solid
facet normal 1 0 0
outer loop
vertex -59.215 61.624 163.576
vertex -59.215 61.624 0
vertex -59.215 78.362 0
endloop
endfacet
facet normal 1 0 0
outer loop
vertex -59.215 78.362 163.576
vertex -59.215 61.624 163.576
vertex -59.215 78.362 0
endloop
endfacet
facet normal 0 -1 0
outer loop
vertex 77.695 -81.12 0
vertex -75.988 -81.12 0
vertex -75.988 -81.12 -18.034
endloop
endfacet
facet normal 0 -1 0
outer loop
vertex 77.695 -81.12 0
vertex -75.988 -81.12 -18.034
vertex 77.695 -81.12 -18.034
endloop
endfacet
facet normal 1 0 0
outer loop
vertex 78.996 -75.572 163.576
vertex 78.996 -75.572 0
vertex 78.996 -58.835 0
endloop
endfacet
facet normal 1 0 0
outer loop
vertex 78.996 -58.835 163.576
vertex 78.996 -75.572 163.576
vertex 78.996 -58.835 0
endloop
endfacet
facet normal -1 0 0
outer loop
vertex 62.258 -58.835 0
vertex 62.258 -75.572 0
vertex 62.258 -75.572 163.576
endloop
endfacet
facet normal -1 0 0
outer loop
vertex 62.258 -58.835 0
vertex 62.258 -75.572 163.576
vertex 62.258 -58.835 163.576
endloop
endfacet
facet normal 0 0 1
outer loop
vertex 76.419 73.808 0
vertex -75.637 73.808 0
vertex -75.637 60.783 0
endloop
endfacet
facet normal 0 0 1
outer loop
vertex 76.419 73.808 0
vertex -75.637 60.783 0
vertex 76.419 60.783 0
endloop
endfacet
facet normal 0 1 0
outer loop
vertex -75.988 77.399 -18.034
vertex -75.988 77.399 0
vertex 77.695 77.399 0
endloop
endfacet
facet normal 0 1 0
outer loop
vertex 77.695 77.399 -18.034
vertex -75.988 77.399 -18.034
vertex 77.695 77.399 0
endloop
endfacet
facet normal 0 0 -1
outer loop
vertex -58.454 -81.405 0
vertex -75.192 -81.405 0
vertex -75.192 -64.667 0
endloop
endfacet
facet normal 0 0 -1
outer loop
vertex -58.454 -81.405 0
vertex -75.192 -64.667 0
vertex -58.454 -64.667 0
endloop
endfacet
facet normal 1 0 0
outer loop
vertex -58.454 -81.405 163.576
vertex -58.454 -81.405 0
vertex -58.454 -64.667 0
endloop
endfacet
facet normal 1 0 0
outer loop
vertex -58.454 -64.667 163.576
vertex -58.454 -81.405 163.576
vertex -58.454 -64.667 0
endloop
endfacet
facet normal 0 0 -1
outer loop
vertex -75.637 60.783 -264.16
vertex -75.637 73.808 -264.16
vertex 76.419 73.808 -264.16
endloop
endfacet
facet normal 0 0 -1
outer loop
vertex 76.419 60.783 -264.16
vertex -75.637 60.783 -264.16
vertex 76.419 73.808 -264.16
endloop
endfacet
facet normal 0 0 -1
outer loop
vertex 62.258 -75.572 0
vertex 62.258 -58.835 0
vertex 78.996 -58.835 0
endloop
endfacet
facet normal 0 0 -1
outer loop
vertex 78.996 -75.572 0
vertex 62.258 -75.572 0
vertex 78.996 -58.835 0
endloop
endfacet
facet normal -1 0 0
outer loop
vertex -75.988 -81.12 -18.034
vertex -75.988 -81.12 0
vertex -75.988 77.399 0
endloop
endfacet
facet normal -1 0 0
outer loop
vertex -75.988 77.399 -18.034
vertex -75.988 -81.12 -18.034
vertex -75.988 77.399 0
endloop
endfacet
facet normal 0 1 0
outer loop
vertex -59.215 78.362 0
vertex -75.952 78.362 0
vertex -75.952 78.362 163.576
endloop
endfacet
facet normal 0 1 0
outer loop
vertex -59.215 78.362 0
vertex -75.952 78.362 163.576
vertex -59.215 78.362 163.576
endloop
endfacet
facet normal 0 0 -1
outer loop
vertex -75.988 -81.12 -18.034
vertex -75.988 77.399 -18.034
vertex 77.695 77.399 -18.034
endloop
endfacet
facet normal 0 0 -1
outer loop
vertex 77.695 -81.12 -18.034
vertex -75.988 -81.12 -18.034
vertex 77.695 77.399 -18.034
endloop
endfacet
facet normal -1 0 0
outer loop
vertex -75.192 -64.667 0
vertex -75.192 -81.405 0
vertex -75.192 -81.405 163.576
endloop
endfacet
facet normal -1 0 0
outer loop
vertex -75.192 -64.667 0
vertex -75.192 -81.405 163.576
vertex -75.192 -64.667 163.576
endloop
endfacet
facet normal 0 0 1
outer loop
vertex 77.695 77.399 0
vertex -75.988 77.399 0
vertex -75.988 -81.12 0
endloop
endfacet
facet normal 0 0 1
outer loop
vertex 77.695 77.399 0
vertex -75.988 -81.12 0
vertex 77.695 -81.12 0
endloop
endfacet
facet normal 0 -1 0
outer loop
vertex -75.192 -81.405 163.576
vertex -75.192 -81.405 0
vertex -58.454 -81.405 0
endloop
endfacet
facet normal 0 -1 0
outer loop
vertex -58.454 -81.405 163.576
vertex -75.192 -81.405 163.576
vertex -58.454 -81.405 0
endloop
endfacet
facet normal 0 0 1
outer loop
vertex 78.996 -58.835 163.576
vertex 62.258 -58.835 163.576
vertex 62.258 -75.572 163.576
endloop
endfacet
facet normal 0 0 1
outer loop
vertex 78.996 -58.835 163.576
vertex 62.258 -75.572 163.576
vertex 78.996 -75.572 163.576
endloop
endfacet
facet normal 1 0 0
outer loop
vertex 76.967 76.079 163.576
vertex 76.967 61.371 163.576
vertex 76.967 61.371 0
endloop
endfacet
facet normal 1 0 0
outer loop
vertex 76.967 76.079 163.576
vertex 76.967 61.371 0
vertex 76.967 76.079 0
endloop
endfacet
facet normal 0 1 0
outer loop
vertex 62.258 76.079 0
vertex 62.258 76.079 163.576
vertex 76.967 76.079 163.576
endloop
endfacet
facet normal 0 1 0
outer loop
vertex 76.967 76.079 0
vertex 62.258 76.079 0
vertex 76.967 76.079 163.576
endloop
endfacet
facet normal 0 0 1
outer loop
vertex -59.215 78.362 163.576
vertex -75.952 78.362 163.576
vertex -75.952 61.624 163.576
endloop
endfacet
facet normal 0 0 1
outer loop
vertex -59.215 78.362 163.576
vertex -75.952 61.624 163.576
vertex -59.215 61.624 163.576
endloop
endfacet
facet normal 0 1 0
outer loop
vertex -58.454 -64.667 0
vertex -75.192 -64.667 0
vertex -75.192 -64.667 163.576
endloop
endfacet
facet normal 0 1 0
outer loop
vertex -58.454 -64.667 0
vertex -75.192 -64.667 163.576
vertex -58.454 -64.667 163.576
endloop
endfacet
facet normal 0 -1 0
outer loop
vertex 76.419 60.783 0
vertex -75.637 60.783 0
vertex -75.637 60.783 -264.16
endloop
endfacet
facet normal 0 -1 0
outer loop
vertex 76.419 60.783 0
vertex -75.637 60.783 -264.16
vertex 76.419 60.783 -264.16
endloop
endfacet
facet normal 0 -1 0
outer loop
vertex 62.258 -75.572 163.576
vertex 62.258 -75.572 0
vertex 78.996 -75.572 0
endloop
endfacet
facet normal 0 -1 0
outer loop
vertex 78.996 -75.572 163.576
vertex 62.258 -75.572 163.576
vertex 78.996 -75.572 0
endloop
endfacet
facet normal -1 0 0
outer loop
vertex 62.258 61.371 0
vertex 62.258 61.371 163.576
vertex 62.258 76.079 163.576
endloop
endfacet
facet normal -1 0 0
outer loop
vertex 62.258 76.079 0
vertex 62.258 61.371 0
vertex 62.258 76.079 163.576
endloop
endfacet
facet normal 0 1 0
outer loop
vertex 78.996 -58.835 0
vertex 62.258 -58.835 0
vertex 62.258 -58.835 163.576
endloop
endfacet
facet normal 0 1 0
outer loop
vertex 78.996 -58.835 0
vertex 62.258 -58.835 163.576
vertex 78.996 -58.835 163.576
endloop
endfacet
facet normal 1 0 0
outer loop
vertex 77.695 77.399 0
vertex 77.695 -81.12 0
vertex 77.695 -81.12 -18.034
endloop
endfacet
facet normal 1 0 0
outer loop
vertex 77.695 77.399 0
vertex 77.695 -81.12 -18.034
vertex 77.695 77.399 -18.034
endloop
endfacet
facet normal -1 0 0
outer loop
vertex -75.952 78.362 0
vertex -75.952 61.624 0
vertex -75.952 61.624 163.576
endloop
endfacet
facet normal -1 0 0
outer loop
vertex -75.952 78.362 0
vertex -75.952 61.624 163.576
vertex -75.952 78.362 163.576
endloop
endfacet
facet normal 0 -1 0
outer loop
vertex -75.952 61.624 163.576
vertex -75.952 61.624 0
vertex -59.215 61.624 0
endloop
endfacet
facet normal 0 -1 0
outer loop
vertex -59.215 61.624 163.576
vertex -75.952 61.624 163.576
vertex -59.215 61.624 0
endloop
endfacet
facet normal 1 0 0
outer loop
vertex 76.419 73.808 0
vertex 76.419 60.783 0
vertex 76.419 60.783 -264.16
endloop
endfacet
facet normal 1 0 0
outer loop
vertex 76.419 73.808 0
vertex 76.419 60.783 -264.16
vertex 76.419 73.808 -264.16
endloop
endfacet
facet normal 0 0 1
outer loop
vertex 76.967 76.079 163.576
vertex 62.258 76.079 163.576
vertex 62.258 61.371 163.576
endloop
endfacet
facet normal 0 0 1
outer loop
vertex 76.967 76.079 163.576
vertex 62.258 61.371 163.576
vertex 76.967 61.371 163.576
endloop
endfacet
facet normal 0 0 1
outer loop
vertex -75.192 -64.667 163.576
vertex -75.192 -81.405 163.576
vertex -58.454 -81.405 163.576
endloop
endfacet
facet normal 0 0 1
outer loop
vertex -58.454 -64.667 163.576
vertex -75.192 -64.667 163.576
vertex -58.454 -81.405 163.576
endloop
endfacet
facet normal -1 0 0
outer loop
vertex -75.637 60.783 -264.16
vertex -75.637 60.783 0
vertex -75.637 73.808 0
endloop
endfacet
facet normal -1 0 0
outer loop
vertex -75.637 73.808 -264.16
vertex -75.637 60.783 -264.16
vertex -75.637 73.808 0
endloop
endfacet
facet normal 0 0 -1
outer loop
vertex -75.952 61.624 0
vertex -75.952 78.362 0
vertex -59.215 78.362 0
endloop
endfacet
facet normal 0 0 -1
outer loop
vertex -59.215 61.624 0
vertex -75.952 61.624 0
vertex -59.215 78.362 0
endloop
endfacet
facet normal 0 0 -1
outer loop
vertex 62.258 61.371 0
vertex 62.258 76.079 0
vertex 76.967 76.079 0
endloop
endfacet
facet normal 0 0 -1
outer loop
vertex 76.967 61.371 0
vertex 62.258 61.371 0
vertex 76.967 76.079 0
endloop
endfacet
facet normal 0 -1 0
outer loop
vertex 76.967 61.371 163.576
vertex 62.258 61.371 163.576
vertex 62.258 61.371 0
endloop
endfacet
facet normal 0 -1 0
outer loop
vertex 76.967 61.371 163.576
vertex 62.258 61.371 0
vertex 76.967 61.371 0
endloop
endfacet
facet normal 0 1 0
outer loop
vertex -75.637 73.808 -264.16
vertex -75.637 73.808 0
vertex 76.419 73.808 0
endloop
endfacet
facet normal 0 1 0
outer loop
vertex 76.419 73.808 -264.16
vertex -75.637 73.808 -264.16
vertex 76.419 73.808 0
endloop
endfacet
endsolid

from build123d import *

# Parameters (mm, degrees)
F0_W     = 16.737432
F0_H     = 16.737432
F0_W_2   = 14.708657
F0_H_2   = 14.708657
F0_W_3   = 16.737431
F0_H_3   = 16.737431
F1_DEPTH = 163.576
F2_W     = 153.683335
F2_H     = 158.519522
F3_DEPTH = 18.034
F4_W     = 152.055375
F4_H     = 13.024777
F5_DEPTH = 264.16


with BuildPart() as f1:
    # F0 (on Top) → F1 (new body)
    with BuildSketch(Plane.XY):
        with Locations((-67.583725, 69.9929)):
            Rectangle(F0_W, F0_H)
        with Locations((69.612502, 68.724913)):
            Rectangle(F0_W_2, F0_H_2)
        with Locations((-66.822931, -73.036068)):
            Rectangle(F0_W_3, F0_H_3)
        with Locations((70.626889, -67.203328)):
            Rectangle(F0_W_3, F0_H)
    extrude(amount=F1_DEPTH)


with BuildPart() as f3:
    # F2 (on Top) → F3 (new body)
    with BuildSketch(Plane.XY):
        with Locations((0.85342, -1.860425)):
            Rectangle(F2_W, F2_H)
    extrude(amount=-F3_DEPTH)


with BuildPart() as f5:
    # F4 (on Top) → F5 (new body)
    with BuildSketch(Plane.XY):
        with Locations((0.391115, 67.295507)):
            Rectangle(F4_W, F4_H)
    extrude(amount=-F5_DEPTH)


solid = Compound([f1.part, f3.part, f5.part])
